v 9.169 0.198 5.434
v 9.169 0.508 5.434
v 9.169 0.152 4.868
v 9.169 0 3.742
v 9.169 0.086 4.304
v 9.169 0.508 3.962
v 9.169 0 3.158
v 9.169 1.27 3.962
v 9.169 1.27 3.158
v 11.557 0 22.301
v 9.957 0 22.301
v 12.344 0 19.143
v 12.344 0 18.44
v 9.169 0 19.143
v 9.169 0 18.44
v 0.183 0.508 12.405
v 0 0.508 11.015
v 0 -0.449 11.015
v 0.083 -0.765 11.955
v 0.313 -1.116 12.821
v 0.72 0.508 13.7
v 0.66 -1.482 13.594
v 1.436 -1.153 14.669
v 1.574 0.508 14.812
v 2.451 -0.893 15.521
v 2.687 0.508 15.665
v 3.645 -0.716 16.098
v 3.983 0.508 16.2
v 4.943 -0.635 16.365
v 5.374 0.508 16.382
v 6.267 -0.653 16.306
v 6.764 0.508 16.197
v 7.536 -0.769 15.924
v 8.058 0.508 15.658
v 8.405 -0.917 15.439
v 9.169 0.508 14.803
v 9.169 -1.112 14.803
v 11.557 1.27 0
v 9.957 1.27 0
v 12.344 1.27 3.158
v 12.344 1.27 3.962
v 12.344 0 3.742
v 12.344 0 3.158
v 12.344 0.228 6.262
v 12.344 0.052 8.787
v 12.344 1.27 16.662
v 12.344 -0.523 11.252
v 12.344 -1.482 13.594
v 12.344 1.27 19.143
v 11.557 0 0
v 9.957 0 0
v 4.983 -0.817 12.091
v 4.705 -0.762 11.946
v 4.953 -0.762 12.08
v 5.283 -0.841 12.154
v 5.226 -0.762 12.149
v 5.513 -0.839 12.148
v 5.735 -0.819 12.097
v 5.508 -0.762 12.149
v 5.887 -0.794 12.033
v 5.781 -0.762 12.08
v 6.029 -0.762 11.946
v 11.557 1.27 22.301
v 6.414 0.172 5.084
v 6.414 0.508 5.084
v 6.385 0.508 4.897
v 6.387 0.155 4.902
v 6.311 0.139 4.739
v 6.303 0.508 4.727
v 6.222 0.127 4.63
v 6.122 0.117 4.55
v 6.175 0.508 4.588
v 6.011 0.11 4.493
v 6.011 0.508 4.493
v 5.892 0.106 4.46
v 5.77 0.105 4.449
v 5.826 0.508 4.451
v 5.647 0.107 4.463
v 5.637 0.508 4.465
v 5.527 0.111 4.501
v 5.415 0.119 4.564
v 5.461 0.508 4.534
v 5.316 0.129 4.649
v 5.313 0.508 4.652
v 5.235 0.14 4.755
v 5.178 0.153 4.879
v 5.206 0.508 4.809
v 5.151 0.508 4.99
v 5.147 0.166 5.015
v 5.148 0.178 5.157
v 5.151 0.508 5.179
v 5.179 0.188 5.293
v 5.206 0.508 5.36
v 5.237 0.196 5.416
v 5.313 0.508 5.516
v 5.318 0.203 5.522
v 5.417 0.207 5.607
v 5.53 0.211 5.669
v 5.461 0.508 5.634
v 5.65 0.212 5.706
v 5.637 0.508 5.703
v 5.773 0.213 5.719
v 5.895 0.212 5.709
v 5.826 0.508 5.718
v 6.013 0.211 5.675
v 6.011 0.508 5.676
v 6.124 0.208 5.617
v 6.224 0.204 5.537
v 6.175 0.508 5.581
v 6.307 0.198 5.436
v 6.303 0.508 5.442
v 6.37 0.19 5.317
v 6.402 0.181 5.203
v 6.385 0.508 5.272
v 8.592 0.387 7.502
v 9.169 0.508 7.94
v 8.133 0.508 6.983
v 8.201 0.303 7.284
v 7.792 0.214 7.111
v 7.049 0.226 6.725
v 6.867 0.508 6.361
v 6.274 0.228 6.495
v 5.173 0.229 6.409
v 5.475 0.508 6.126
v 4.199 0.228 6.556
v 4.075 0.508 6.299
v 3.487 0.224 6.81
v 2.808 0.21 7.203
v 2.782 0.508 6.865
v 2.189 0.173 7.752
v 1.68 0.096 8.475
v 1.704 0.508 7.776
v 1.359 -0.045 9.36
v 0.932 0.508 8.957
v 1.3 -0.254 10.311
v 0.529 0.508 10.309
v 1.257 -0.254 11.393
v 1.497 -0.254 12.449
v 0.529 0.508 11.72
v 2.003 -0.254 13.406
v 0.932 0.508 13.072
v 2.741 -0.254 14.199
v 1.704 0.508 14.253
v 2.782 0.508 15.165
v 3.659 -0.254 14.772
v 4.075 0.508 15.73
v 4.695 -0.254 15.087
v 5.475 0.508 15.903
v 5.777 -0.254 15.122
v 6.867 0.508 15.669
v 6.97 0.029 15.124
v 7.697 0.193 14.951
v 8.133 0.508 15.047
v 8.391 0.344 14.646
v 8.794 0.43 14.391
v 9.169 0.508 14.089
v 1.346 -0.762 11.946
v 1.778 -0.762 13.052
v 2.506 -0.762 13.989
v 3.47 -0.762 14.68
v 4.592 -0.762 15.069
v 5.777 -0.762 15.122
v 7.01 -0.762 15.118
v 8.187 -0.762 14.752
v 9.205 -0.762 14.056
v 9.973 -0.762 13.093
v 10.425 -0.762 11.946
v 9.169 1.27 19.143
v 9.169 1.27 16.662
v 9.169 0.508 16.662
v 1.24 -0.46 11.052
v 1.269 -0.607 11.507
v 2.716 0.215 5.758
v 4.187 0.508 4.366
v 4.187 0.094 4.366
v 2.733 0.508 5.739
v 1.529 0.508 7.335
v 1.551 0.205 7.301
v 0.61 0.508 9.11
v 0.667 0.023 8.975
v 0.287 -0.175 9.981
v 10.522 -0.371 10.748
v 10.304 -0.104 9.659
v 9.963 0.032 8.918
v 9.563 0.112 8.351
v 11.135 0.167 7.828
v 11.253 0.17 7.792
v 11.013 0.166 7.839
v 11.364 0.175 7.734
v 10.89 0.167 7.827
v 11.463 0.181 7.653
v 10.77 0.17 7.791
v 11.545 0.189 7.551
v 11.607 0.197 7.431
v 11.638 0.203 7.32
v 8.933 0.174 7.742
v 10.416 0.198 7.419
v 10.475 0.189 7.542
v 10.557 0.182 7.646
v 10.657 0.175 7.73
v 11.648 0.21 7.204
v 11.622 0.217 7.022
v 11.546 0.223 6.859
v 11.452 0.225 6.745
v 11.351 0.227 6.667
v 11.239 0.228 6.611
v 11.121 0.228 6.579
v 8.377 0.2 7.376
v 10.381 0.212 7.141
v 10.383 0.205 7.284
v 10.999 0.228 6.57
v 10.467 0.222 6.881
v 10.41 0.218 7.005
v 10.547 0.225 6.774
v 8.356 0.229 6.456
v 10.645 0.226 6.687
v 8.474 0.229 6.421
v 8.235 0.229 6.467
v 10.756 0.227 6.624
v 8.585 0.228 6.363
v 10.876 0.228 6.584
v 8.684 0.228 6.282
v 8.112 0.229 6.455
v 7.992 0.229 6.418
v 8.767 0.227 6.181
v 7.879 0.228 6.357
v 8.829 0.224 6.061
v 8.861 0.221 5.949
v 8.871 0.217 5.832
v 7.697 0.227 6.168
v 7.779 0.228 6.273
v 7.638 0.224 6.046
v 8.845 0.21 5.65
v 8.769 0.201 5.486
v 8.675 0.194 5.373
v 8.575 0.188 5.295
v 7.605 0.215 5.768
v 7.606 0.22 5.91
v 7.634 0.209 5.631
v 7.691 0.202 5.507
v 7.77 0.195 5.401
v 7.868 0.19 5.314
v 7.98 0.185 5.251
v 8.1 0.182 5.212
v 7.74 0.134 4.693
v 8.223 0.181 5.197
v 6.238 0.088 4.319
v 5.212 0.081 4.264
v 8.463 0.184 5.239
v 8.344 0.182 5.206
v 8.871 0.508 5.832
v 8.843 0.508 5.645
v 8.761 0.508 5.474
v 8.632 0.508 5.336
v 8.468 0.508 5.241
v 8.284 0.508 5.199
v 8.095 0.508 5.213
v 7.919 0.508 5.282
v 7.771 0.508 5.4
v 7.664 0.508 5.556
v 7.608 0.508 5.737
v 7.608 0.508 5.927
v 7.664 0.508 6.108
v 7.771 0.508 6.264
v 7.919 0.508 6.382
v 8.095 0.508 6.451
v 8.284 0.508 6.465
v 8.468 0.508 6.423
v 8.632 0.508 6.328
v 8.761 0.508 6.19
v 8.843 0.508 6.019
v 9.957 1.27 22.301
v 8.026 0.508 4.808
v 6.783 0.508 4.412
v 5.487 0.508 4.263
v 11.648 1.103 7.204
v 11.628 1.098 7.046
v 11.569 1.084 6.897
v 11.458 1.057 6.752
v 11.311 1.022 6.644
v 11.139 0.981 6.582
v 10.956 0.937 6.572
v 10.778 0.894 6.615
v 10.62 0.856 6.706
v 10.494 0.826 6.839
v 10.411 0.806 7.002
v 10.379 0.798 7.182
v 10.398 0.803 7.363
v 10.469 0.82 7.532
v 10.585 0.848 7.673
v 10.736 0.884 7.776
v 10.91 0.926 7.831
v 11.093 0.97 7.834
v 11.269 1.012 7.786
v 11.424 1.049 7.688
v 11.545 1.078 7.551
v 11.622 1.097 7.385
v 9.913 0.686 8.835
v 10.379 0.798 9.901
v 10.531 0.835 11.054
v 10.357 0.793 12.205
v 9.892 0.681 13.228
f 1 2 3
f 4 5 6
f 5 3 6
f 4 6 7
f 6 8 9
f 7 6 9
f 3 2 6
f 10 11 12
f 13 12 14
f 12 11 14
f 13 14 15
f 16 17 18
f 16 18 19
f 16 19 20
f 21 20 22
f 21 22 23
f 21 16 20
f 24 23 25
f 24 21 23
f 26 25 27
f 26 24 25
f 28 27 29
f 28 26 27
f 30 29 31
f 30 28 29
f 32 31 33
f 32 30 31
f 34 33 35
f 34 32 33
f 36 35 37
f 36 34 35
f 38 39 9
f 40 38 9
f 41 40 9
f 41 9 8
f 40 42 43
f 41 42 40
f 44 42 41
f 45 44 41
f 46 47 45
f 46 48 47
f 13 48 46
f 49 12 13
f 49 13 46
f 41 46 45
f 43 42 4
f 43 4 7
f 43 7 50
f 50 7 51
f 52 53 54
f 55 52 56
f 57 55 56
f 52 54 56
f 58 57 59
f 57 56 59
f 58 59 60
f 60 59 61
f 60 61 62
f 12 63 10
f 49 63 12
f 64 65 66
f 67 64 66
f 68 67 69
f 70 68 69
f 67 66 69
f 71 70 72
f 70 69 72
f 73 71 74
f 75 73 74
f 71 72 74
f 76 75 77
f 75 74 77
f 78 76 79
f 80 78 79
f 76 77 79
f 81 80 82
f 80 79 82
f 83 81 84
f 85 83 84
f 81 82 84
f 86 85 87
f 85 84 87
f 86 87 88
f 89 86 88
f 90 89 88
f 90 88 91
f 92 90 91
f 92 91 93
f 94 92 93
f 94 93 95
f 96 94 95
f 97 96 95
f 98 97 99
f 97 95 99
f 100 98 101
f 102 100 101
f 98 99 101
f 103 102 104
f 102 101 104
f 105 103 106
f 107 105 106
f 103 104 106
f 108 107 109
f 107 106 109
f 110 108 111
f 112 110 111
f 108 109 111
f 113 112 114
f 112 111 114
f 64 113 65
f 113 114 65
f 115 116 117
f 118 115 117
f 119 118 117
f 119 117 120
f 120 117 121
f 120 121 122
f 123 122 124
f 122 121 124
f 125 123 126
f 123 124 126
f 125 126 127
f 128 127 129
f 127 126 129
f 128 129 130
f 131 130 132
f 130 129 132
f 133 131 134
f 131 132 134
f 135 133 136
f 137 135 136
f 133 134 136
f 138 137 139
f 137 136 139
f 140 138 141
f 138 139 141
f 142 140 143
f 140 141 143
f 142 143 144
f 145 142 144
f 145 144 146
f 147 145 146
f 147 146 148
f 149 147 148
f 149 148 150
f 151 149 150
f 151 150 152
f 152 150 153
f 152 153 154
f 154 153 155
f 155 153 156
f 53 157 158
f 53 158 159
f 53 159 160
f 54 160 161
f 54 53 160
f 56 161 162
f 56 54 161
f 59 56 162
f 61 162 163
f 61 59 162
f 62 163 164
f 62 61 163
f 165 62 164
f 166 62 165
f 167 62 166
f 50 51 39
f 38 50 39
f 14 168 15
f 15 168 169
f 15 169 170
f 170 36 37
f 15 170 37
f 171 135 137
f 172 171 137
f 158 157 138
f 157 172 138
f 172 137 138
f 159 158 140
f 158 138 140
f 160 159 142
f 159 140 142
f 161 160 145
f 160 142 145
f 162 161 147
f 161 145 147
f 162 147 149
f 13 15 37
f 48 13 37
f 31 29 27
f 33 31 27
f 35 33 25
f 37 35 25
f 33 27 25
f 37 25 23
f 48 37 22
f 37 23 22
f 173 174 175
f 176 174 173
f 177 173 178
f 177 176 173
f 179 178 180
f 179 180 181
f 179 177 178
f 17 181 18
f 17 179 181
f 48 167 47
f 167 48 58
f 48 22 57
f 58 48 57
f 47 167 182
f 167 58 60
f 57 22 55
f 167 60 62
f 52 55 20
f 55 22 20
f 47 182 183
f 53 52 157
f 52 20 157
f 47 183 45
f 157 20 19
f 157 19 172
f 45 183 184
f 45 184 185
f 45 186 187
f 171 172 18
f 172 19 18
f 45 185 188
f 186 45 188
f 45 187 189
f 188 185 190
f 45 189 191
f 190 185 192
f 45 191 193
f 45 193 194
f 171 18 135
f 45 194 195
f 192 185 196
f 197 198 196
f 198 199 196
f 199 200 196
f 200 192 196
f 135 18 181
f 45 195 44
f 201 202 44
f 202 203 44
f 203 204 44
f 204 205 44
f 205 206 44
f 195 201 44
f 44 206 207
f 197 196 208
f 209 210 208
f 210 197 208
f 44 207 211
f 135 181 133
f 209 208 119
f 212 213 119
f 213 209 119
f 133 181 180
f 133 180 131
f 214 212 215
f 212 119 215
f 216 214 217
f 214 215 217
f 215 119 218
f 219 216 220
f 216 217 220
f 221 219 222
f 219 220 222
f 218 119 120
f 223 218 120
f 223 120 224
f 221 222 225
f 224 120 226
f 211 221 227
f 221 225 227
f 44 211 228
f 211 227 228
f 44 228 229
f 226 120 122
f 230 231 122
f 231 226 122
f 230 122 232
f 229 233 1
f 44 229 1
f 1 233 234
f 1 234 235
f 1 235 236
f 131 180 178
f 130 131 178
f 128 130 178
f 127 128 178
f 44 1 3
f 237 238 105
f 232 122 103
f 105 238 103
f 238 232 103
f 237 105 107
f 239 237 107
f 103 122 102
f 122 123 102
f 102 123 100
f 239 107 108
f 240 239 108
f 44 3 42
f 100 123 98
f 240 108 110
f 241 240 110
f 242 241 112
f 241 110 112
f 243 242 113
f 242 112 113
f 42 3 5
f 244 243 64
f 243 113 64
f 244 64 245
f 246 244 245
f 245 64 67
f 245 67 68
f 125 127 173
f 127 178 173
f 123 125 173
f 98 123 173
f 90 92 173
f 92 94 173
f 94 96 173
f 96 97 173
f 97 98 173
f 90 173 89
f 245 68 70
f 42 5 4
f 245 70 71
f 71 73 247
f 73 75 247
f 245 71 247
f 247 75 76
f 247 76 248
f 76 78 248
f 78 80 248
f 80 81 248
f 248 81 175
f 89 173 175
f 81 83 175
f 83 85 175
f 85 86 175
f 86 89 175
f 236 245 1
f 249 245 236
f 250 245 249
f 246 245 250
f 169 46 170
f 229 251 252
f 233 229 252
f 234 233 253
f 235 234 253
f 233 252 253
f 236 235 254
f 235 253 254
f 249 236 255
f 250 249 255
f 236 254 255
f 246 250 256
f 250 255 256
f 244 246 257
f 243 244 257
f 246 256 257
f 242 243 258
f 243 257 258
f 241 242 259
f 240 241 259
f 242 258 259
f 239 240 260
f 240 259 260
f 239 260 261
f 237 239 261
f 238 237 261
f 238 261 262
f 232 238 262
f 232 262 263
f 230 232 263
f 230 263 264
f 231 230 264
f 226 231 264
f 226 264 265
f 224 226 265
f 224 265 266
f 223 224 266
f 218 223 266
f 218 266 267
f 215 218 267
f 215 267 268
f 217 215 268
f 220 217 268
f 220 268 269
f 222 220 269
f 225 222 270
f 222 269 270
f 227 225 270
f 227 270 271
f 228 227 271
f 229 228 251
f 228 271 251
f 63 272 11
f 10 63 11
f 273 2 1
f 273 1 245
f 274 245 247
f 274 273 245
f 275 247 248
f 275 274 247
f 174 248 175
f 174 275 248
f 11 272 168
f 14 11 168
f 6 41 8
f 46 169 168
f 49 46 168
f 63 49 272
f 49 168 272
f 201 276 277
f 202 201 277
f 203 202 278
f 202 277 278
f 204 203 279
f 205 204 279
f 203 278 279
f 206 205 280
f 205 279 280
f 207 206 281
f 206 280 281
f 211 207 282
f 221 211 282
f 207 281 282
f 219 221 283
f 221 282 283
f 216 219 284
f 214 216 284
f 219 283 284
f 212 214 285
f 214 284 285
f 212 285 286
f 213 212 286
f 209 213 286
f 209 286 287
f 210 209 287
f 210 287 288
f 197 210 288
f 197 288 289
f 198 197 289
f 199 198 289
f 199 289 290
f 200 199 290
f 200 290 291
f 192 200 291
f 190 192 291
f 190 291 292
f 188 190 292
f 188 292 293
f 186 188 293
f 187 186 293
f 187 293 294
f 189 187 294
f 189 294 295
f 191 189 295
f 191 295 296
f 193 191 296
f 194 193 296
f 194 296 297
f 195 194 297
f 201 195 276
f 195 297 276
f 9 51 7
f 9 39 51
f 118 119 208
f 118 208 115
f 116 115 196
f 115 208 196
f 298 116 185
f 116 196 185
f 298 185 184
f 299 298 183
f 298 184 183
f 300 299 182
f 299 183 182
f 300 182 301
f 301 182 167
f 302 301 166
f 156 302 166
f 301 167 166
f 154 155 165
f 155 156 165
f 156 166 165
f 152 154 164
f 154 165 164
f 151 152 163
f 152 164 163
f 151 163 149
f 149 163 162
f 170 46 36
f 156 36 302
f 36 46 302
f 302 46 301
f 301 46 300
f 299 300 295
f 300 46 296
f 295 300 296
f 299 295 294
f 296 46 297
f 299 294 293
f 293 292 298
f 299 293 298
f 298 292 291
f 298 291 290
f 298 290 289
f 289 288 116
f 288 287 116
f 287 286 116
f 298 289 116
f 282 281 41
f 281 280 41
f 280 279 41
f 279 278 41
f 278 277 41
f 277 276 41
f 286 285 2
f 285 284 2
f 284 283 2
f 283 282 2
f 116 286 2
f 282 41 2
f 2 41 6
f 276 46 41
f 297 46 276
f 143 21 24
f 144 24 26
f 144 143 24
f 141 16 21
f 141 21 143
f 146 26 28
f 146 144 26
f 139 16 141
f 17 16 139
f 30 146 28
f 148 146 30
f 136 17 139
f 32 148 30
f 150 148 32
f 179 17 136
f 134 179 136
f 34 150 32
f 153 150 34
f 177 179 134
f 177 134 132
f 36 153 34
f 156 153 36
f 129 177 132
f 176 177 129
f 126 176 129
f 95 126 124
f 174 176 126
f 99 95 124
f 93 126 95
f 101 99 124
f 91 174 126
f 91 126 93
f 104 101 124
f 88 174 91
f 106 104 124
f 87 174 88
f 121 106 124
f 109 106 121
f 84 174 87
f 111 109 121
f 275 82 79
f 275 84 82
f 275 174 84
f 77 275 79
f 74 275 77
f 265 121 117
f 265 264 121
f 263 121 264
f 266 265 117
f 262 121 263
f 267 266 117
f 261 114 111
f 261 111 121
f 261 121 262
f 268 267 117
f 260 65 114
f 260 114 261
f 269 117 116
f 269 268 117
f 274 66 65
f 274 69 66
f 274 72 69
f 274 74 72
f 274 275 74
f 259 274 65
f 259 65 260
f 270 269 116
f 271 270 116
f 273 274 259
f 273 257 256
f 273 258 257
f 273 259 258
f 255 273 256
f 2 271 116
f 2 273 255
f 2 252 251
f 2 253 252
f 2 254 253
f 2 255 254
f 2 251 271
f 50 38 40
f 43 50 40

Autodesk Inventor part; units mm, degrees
ref_plane "YZ Plane" through (0, 0, 0) normal (1, 0, 0) x (0, 1, 0)
ref_plane "XZ Plane" through (0, 0, 0) normal (0, 1, 0) x (-1, 0, 0)
ref_plane "XY Plane" through (0, 0, 0) normal (0, 0, 1) x (1, 0, 0)
sketch "Sketch1" plane through (0, 0, 0) normal (1, 0, 0) x (0, 1, 0)
  line L0 (0, 0) -> (1.27, 0)
  line L1 (1.27, 0) -> (1.27, 22.3012)
  line L2 (1.27, 22.3012) -> (0, 22.3012)
  arc A0 (0, 3.7418) -> (-1.4817, 13.594) centre (-15.6464, 6.4262) ccw
  line L3 (0, 18.4404) -> (-1.4817, 13.594)
  line L4 (0, 22.3012) -> (0, 18.4404)
  line L5 (0, 3.7418) -> (0, 0)
  dimension "d0" = 1.27
  dimension "d1" = 22.3012
  dimension "d2" = 31.75
  dimension "d3" = 6.4262
  dimension "d4" = 16.9164
  dimension "d6" = 3.8608
extrude "Extrusion1" add sketch "Sketch1" along normal blind 12.3444
sketch "Sketch2" plane through (0, 1.27, 22.3012) normal (0, 1, 0) x (1, 0, 0)
  line L0 (0, 0) -> (12.3444, 0) projected
  line L1 (9.9568, 0) -> (9.1694, 3.1581)
  line L2 (11.557, 0) -> (12.3444, 3.1581)
  line L3 (9.1694, 3.1581) -> (9.1694, 19.1431)
  line L4 (12.3444, 22.3012) -> (12.3444, 0) projected
  line L5 (10.7569, 0) -> (10.7569, 22.3012)
  line L6 (0, 22.3012) -> (12.3444, 22.3012) projected
  line L7 (9.9568, 22.3012) -> (9.1694, 19.1431)
  line L8 (11.557, 22.3012) -> (12.3444, 19.1431)
  line L9 (9.1694, 19.1431) -> (0, 19.1431)
  line L10 (9.1694, 3.1581) -> (0, 3.1581)
  line L11 (0, 22.3012) -> (0, 0) projected
  line L12 (0, 19.1431) -> (0, 22.3012)
  line L13 (0, 22.3012) -> (9.9568, 22.3012)
  line L14 (0, 3.1581) -> (0, 0)
  dimension "d9" = 1.6002
  dimension "d13" = 28
  dimension "d14" = 3.175
  dimension "d15" = 1.5875
  dimension "d16" = 1.6002
  dimension "d17" = 28
extrude "Extrusion2" cut sketch "Sketch2" against normal blind 25.4 contours L11 L10 L1 L0 | L11 L6 L7 L9 | L2 L4 L0 | L6 L4 L8
sketch "Sketch8" plane through (0, 1.27, 3.1581) normal (0, 1, 0) x (1, 0, 0)
  line L0 (9.1694, -0.8043) -> (0, -0.8043)
  line L1 (9.1694, 0) -> (0, 0) projected
  line L2 (0, -0.8043) -> (9.1694, -0.8043)
  line L3 (9.1694, -0.8043) -> (9.1694, 0)
  line L4 (9.1694, 0) -> (0, 0)
  line L5 (0, 0) -> (0, -0.8043)
  point P0 (0, 3.1581)
  point P1 (0, -10.4309)
extrude "Extrusion5" cut sketch "Sketch8" against normal blind 25.4
sketch "Sketch9" plane through (9.9568, 1.27, 22.3012) normal (0, 1, 0) x (1, 0, 0)
  line L0 (-10.6834, 14.9326) -> (-5.2324, 18.3388)
  line L1 (-5.2324, 18.3388) -> (-10.6834, 18.3388)
  line L2 (-10.6834, 18.3388) -> (-10.6834, 14.9326)
  line L3 (-0.7874, 19.1431) -> (-0.7874, 18.3388) projected
  line L4 (-0.7874, 18.3388) -> (-9.9568, 18.3388) projected
  point P0 (-9.9568, 22.3012)
  dimension "d41" = 32
  dimension "d42" = 4.445
extrude "Extrusion6" cut sketch "Sketch9" against normal blind 25.4
sketch "Sketch14" plane through (9.9568, 1.27, 22.3012) normal (0, 1, 0) x (1, 0, 0)
  circle A0 centre (-4.5896, 11.2866) radius 1.143
  line L0 (-5.2273, 9.7597) -> (-3.813, 11.1739)
  line L1 (-5.2273, 9.7597) -> (-3.2273, 9.7597) construction
  line L2 (-3.813, 11.1739) -> (-5.2273, 11.1739)
  line L3 (-5.2273, 11.1739) -> (-5.2273, 9.7597)
  line L4 (-3.813, 11.1739) -> (-3.813, 9.7597)
  line L5 (-3.813, 9.7597) -> (-5.2273, 9.7597)
  circle A1 centre (-4.5201, 10.4668) radius 3.175
  point P0 (-9.9568, 22.3012)
  dimension "d78" = 2.286
  dimension "d86" = 2
  dimension "d87" = 45
  dimension "d88" = 6.35
extrude "Extrusion11" cut sketch "Sketch14" against normal blind 25.4 contours A0 L4 L2 L3 | L3 L2 L0 A0 | A0 L0 L4
sketch "Sketch15" plane through (9.9568, 1.27, 22.3012) normal (0, 1, 0) x (1, 0, 0)
  circle A0 centre (-4.5896, 11.2866) radius 1.143 projected
  circle A1 centre (-4.5896, 11.2866) radius 0.9525
  circle A2 centre (-4.5896, 11.2866) radius 4.1275
  point P0 (-9.9568, 22.3012)
  dimension "d82" = 1.905
  dimension "d83" = 8.255
extrude "Extrusion12" cut sketch "Sketch15" against normal blind 2.032 contours A2
sketch "Sketch19" plane through (9.9568, 1.27, 22.3012) normal (0, 1, 0) x (1, 0, 0)
  circle A0 centre (1.0564, 15.0967) radius 0.635
  circle A1 centre (-1.7204, 16.4692) radius 0.635
  circle A2 centre (-4.1782, 17.2168) radius 0.635
  point P0 (-9.9568, 22.3012)
  dimension "d102" = 1.27
  dimension "d103" = 1.27
  dimension "d104" = 1.27
extrude "Extrusion17" cut sketch "Sketch19" against normal blind 2.286
sketch "Sketch27" plane through (9.1694, 0.0362, 3.9624) normal (0, 0, -1) x (-1, 0, 0)
  line L0 (0, 1.2338) -> (0, -0.0362) projected
  line L1 (9.1694, 1.2338) -> (9.1694, 0.1848) projected
  line L2 (0, 1.2338) -> (9.1694, 1.2338)
  line L3 (9.1694, 1.2338) -> (9.1694, 0.4718)
  line L4 (9.1694, 0.4718) -> (0, 0.4718)
  line L5 (0, 0.4718) -> (0, 1.2338)
  point P0 (9.1694, -0.0362)
  dimension "d122" = 0.762
extrude "Extrusion22" cut sketch "Sketch27" against normal through all
sketch "Sketch29" plane through (4.7244, 0.508, 3.9624) normal (0, 1, 0) x (1, 0, 0)
  arc A0 (-0.0195, -7.9838) -> (1.3051, -7.9838) centre (0.6428, -7.0522) ccw projected
  arc A1 (-4.7244, -7.0522) -> (4.445, -10.8404) centre (0.6428, -7.0522) ccw
  line L0 (-4.7244, -15.1807) -> (-4.7244, -2.9521) projected
  line L1 (4.445, -8.6583) -> (4.445, -15.1807) projected
  line L2 (4.445, -10.8404) -> (4.445, -15.1807)
  line L3 (4.445, -15.1807) -> (-4.7244, -15.1807)
  point P0 (-4.7244, 3.9624)
extrude "Extrusion23" cut sketch "Sketch29" against normal through all
sketch "Sketch30" plane through (4.7244, 0.508, 3.9624) normal (0, 1, 0) x (1, 0, 0)
  line L0 (0, 0) -> (-4.7244, -2.9521) projected
  line L1 (-4.7244, -2.9521) -> (-4.7244, -7.0522) projected
  arc A0 (0, 0) -> (-4.7244, -7.0522) centre (6.8812, -9.7184) ccw
  line L2 (-4.7244, -7.0522) -> (-4.7244, -2.9521)
  point P0 (-4.7244, 3.9624)
extrude "Extrusion24" cut sketch "Sketch30" against normal through all
sketch "Sketch32" plane through (9.1694, 0.0362, 3.9624) normal (0, 0, -1) x (-1, 0, 0)
  line L0 (4.445, 0.4718) -> (0, 0.4718) projected
  line L1 (0, 0.4718) -> (0, 1.2338)
  line L2 (0, 1.2338) -> (-3.175, 1.2338)
  line L3 (0, 0.4718) -> (0, 0) projected
  line L4 (-3.175, 1.2338) -> (0, 0.4718)
  point P0 (9.1694, -0.0362)
extrude "Extrusion26" cut sketch "Sketch32" against normal blind 12.7
sketch "Sketch37" plane through (4.7244, 0.508, 3.9624) normal (0, 1, 0) x (1, 0, 0)
  arc A0 (4.445, -5.4461) -> (4.445, -8.6583) centre (0.6428, -7.0522) ccw projected
  arc A1 (4.445, -1.4721) -> (-0.5374, -0.4038) centre (0.6428, -7.0522) ccw
  line L0 (4.445, 0) -> (4.445, -5.4461) projected
  line L1 (4.445, -1.4721) -> (4.445, 0)
  line L2 (4.445, 0) -> (0, 0)
  arc A2 (0, 0) -> (-4.7244, -7.0522) centre (6.8812, -9.7184) ccw projected
  line L3 (0, 0) -> (4.445, 0) projected
  arc A3 (0, 0) -> (-0.5374, -0.4038) centre (1.2434, -2.2145) ccw
  point P0 (-4.7244, 3.9624)
extrude "Extrusion27" cut sketch "Sketch37" against normal blind 12.7 contours A1 A2 L2 L0
chamfer "Chamfer4" distance 0.762 angle 45 1 edges at (1.2397, 0.508, 11.0146)
sketch "Sketch38" plane through (9.9568, -0.762, 22.3012) normal (0, 1, 0) x (1, 0, 0)
  ellipse E0 centre (-3.5768, 11.2866) end of major axis (-7.7968, 11.2866) minor radius 4.0967 (-3.9624, 7.207) -> (-0.7874, 8.2124) ccw projected
  arc A0 (-4.2943, 7.198) -> (-4.2943, 15.3752) centre (-3.5768, 11.2866) ccw
  arc A1 (-3.9624, 7.207) -> (-2.158, 14.6218) centre (-4.5896, 11.2866) ccw projected
  arc A2 (-4.2943, 7.198) -> (-4.2943, 15.3752) centre (-4.5896, 11.2866) ccw
  point P0 (-9.9568, 22.3012)
extrude "Extrusion28" cut sketch "Sketch38" along normal blind 12.7
sketch "Sketch39" plane through (5.3672, 0.508, 11.0146) normal (0, 1, 0) x (1, 0, 0)
  point P0 (-5.3672, 11.0146)
equation "\"d15\" = 0.5 * d14"
properties part number "headppost_Turi_2gen"
